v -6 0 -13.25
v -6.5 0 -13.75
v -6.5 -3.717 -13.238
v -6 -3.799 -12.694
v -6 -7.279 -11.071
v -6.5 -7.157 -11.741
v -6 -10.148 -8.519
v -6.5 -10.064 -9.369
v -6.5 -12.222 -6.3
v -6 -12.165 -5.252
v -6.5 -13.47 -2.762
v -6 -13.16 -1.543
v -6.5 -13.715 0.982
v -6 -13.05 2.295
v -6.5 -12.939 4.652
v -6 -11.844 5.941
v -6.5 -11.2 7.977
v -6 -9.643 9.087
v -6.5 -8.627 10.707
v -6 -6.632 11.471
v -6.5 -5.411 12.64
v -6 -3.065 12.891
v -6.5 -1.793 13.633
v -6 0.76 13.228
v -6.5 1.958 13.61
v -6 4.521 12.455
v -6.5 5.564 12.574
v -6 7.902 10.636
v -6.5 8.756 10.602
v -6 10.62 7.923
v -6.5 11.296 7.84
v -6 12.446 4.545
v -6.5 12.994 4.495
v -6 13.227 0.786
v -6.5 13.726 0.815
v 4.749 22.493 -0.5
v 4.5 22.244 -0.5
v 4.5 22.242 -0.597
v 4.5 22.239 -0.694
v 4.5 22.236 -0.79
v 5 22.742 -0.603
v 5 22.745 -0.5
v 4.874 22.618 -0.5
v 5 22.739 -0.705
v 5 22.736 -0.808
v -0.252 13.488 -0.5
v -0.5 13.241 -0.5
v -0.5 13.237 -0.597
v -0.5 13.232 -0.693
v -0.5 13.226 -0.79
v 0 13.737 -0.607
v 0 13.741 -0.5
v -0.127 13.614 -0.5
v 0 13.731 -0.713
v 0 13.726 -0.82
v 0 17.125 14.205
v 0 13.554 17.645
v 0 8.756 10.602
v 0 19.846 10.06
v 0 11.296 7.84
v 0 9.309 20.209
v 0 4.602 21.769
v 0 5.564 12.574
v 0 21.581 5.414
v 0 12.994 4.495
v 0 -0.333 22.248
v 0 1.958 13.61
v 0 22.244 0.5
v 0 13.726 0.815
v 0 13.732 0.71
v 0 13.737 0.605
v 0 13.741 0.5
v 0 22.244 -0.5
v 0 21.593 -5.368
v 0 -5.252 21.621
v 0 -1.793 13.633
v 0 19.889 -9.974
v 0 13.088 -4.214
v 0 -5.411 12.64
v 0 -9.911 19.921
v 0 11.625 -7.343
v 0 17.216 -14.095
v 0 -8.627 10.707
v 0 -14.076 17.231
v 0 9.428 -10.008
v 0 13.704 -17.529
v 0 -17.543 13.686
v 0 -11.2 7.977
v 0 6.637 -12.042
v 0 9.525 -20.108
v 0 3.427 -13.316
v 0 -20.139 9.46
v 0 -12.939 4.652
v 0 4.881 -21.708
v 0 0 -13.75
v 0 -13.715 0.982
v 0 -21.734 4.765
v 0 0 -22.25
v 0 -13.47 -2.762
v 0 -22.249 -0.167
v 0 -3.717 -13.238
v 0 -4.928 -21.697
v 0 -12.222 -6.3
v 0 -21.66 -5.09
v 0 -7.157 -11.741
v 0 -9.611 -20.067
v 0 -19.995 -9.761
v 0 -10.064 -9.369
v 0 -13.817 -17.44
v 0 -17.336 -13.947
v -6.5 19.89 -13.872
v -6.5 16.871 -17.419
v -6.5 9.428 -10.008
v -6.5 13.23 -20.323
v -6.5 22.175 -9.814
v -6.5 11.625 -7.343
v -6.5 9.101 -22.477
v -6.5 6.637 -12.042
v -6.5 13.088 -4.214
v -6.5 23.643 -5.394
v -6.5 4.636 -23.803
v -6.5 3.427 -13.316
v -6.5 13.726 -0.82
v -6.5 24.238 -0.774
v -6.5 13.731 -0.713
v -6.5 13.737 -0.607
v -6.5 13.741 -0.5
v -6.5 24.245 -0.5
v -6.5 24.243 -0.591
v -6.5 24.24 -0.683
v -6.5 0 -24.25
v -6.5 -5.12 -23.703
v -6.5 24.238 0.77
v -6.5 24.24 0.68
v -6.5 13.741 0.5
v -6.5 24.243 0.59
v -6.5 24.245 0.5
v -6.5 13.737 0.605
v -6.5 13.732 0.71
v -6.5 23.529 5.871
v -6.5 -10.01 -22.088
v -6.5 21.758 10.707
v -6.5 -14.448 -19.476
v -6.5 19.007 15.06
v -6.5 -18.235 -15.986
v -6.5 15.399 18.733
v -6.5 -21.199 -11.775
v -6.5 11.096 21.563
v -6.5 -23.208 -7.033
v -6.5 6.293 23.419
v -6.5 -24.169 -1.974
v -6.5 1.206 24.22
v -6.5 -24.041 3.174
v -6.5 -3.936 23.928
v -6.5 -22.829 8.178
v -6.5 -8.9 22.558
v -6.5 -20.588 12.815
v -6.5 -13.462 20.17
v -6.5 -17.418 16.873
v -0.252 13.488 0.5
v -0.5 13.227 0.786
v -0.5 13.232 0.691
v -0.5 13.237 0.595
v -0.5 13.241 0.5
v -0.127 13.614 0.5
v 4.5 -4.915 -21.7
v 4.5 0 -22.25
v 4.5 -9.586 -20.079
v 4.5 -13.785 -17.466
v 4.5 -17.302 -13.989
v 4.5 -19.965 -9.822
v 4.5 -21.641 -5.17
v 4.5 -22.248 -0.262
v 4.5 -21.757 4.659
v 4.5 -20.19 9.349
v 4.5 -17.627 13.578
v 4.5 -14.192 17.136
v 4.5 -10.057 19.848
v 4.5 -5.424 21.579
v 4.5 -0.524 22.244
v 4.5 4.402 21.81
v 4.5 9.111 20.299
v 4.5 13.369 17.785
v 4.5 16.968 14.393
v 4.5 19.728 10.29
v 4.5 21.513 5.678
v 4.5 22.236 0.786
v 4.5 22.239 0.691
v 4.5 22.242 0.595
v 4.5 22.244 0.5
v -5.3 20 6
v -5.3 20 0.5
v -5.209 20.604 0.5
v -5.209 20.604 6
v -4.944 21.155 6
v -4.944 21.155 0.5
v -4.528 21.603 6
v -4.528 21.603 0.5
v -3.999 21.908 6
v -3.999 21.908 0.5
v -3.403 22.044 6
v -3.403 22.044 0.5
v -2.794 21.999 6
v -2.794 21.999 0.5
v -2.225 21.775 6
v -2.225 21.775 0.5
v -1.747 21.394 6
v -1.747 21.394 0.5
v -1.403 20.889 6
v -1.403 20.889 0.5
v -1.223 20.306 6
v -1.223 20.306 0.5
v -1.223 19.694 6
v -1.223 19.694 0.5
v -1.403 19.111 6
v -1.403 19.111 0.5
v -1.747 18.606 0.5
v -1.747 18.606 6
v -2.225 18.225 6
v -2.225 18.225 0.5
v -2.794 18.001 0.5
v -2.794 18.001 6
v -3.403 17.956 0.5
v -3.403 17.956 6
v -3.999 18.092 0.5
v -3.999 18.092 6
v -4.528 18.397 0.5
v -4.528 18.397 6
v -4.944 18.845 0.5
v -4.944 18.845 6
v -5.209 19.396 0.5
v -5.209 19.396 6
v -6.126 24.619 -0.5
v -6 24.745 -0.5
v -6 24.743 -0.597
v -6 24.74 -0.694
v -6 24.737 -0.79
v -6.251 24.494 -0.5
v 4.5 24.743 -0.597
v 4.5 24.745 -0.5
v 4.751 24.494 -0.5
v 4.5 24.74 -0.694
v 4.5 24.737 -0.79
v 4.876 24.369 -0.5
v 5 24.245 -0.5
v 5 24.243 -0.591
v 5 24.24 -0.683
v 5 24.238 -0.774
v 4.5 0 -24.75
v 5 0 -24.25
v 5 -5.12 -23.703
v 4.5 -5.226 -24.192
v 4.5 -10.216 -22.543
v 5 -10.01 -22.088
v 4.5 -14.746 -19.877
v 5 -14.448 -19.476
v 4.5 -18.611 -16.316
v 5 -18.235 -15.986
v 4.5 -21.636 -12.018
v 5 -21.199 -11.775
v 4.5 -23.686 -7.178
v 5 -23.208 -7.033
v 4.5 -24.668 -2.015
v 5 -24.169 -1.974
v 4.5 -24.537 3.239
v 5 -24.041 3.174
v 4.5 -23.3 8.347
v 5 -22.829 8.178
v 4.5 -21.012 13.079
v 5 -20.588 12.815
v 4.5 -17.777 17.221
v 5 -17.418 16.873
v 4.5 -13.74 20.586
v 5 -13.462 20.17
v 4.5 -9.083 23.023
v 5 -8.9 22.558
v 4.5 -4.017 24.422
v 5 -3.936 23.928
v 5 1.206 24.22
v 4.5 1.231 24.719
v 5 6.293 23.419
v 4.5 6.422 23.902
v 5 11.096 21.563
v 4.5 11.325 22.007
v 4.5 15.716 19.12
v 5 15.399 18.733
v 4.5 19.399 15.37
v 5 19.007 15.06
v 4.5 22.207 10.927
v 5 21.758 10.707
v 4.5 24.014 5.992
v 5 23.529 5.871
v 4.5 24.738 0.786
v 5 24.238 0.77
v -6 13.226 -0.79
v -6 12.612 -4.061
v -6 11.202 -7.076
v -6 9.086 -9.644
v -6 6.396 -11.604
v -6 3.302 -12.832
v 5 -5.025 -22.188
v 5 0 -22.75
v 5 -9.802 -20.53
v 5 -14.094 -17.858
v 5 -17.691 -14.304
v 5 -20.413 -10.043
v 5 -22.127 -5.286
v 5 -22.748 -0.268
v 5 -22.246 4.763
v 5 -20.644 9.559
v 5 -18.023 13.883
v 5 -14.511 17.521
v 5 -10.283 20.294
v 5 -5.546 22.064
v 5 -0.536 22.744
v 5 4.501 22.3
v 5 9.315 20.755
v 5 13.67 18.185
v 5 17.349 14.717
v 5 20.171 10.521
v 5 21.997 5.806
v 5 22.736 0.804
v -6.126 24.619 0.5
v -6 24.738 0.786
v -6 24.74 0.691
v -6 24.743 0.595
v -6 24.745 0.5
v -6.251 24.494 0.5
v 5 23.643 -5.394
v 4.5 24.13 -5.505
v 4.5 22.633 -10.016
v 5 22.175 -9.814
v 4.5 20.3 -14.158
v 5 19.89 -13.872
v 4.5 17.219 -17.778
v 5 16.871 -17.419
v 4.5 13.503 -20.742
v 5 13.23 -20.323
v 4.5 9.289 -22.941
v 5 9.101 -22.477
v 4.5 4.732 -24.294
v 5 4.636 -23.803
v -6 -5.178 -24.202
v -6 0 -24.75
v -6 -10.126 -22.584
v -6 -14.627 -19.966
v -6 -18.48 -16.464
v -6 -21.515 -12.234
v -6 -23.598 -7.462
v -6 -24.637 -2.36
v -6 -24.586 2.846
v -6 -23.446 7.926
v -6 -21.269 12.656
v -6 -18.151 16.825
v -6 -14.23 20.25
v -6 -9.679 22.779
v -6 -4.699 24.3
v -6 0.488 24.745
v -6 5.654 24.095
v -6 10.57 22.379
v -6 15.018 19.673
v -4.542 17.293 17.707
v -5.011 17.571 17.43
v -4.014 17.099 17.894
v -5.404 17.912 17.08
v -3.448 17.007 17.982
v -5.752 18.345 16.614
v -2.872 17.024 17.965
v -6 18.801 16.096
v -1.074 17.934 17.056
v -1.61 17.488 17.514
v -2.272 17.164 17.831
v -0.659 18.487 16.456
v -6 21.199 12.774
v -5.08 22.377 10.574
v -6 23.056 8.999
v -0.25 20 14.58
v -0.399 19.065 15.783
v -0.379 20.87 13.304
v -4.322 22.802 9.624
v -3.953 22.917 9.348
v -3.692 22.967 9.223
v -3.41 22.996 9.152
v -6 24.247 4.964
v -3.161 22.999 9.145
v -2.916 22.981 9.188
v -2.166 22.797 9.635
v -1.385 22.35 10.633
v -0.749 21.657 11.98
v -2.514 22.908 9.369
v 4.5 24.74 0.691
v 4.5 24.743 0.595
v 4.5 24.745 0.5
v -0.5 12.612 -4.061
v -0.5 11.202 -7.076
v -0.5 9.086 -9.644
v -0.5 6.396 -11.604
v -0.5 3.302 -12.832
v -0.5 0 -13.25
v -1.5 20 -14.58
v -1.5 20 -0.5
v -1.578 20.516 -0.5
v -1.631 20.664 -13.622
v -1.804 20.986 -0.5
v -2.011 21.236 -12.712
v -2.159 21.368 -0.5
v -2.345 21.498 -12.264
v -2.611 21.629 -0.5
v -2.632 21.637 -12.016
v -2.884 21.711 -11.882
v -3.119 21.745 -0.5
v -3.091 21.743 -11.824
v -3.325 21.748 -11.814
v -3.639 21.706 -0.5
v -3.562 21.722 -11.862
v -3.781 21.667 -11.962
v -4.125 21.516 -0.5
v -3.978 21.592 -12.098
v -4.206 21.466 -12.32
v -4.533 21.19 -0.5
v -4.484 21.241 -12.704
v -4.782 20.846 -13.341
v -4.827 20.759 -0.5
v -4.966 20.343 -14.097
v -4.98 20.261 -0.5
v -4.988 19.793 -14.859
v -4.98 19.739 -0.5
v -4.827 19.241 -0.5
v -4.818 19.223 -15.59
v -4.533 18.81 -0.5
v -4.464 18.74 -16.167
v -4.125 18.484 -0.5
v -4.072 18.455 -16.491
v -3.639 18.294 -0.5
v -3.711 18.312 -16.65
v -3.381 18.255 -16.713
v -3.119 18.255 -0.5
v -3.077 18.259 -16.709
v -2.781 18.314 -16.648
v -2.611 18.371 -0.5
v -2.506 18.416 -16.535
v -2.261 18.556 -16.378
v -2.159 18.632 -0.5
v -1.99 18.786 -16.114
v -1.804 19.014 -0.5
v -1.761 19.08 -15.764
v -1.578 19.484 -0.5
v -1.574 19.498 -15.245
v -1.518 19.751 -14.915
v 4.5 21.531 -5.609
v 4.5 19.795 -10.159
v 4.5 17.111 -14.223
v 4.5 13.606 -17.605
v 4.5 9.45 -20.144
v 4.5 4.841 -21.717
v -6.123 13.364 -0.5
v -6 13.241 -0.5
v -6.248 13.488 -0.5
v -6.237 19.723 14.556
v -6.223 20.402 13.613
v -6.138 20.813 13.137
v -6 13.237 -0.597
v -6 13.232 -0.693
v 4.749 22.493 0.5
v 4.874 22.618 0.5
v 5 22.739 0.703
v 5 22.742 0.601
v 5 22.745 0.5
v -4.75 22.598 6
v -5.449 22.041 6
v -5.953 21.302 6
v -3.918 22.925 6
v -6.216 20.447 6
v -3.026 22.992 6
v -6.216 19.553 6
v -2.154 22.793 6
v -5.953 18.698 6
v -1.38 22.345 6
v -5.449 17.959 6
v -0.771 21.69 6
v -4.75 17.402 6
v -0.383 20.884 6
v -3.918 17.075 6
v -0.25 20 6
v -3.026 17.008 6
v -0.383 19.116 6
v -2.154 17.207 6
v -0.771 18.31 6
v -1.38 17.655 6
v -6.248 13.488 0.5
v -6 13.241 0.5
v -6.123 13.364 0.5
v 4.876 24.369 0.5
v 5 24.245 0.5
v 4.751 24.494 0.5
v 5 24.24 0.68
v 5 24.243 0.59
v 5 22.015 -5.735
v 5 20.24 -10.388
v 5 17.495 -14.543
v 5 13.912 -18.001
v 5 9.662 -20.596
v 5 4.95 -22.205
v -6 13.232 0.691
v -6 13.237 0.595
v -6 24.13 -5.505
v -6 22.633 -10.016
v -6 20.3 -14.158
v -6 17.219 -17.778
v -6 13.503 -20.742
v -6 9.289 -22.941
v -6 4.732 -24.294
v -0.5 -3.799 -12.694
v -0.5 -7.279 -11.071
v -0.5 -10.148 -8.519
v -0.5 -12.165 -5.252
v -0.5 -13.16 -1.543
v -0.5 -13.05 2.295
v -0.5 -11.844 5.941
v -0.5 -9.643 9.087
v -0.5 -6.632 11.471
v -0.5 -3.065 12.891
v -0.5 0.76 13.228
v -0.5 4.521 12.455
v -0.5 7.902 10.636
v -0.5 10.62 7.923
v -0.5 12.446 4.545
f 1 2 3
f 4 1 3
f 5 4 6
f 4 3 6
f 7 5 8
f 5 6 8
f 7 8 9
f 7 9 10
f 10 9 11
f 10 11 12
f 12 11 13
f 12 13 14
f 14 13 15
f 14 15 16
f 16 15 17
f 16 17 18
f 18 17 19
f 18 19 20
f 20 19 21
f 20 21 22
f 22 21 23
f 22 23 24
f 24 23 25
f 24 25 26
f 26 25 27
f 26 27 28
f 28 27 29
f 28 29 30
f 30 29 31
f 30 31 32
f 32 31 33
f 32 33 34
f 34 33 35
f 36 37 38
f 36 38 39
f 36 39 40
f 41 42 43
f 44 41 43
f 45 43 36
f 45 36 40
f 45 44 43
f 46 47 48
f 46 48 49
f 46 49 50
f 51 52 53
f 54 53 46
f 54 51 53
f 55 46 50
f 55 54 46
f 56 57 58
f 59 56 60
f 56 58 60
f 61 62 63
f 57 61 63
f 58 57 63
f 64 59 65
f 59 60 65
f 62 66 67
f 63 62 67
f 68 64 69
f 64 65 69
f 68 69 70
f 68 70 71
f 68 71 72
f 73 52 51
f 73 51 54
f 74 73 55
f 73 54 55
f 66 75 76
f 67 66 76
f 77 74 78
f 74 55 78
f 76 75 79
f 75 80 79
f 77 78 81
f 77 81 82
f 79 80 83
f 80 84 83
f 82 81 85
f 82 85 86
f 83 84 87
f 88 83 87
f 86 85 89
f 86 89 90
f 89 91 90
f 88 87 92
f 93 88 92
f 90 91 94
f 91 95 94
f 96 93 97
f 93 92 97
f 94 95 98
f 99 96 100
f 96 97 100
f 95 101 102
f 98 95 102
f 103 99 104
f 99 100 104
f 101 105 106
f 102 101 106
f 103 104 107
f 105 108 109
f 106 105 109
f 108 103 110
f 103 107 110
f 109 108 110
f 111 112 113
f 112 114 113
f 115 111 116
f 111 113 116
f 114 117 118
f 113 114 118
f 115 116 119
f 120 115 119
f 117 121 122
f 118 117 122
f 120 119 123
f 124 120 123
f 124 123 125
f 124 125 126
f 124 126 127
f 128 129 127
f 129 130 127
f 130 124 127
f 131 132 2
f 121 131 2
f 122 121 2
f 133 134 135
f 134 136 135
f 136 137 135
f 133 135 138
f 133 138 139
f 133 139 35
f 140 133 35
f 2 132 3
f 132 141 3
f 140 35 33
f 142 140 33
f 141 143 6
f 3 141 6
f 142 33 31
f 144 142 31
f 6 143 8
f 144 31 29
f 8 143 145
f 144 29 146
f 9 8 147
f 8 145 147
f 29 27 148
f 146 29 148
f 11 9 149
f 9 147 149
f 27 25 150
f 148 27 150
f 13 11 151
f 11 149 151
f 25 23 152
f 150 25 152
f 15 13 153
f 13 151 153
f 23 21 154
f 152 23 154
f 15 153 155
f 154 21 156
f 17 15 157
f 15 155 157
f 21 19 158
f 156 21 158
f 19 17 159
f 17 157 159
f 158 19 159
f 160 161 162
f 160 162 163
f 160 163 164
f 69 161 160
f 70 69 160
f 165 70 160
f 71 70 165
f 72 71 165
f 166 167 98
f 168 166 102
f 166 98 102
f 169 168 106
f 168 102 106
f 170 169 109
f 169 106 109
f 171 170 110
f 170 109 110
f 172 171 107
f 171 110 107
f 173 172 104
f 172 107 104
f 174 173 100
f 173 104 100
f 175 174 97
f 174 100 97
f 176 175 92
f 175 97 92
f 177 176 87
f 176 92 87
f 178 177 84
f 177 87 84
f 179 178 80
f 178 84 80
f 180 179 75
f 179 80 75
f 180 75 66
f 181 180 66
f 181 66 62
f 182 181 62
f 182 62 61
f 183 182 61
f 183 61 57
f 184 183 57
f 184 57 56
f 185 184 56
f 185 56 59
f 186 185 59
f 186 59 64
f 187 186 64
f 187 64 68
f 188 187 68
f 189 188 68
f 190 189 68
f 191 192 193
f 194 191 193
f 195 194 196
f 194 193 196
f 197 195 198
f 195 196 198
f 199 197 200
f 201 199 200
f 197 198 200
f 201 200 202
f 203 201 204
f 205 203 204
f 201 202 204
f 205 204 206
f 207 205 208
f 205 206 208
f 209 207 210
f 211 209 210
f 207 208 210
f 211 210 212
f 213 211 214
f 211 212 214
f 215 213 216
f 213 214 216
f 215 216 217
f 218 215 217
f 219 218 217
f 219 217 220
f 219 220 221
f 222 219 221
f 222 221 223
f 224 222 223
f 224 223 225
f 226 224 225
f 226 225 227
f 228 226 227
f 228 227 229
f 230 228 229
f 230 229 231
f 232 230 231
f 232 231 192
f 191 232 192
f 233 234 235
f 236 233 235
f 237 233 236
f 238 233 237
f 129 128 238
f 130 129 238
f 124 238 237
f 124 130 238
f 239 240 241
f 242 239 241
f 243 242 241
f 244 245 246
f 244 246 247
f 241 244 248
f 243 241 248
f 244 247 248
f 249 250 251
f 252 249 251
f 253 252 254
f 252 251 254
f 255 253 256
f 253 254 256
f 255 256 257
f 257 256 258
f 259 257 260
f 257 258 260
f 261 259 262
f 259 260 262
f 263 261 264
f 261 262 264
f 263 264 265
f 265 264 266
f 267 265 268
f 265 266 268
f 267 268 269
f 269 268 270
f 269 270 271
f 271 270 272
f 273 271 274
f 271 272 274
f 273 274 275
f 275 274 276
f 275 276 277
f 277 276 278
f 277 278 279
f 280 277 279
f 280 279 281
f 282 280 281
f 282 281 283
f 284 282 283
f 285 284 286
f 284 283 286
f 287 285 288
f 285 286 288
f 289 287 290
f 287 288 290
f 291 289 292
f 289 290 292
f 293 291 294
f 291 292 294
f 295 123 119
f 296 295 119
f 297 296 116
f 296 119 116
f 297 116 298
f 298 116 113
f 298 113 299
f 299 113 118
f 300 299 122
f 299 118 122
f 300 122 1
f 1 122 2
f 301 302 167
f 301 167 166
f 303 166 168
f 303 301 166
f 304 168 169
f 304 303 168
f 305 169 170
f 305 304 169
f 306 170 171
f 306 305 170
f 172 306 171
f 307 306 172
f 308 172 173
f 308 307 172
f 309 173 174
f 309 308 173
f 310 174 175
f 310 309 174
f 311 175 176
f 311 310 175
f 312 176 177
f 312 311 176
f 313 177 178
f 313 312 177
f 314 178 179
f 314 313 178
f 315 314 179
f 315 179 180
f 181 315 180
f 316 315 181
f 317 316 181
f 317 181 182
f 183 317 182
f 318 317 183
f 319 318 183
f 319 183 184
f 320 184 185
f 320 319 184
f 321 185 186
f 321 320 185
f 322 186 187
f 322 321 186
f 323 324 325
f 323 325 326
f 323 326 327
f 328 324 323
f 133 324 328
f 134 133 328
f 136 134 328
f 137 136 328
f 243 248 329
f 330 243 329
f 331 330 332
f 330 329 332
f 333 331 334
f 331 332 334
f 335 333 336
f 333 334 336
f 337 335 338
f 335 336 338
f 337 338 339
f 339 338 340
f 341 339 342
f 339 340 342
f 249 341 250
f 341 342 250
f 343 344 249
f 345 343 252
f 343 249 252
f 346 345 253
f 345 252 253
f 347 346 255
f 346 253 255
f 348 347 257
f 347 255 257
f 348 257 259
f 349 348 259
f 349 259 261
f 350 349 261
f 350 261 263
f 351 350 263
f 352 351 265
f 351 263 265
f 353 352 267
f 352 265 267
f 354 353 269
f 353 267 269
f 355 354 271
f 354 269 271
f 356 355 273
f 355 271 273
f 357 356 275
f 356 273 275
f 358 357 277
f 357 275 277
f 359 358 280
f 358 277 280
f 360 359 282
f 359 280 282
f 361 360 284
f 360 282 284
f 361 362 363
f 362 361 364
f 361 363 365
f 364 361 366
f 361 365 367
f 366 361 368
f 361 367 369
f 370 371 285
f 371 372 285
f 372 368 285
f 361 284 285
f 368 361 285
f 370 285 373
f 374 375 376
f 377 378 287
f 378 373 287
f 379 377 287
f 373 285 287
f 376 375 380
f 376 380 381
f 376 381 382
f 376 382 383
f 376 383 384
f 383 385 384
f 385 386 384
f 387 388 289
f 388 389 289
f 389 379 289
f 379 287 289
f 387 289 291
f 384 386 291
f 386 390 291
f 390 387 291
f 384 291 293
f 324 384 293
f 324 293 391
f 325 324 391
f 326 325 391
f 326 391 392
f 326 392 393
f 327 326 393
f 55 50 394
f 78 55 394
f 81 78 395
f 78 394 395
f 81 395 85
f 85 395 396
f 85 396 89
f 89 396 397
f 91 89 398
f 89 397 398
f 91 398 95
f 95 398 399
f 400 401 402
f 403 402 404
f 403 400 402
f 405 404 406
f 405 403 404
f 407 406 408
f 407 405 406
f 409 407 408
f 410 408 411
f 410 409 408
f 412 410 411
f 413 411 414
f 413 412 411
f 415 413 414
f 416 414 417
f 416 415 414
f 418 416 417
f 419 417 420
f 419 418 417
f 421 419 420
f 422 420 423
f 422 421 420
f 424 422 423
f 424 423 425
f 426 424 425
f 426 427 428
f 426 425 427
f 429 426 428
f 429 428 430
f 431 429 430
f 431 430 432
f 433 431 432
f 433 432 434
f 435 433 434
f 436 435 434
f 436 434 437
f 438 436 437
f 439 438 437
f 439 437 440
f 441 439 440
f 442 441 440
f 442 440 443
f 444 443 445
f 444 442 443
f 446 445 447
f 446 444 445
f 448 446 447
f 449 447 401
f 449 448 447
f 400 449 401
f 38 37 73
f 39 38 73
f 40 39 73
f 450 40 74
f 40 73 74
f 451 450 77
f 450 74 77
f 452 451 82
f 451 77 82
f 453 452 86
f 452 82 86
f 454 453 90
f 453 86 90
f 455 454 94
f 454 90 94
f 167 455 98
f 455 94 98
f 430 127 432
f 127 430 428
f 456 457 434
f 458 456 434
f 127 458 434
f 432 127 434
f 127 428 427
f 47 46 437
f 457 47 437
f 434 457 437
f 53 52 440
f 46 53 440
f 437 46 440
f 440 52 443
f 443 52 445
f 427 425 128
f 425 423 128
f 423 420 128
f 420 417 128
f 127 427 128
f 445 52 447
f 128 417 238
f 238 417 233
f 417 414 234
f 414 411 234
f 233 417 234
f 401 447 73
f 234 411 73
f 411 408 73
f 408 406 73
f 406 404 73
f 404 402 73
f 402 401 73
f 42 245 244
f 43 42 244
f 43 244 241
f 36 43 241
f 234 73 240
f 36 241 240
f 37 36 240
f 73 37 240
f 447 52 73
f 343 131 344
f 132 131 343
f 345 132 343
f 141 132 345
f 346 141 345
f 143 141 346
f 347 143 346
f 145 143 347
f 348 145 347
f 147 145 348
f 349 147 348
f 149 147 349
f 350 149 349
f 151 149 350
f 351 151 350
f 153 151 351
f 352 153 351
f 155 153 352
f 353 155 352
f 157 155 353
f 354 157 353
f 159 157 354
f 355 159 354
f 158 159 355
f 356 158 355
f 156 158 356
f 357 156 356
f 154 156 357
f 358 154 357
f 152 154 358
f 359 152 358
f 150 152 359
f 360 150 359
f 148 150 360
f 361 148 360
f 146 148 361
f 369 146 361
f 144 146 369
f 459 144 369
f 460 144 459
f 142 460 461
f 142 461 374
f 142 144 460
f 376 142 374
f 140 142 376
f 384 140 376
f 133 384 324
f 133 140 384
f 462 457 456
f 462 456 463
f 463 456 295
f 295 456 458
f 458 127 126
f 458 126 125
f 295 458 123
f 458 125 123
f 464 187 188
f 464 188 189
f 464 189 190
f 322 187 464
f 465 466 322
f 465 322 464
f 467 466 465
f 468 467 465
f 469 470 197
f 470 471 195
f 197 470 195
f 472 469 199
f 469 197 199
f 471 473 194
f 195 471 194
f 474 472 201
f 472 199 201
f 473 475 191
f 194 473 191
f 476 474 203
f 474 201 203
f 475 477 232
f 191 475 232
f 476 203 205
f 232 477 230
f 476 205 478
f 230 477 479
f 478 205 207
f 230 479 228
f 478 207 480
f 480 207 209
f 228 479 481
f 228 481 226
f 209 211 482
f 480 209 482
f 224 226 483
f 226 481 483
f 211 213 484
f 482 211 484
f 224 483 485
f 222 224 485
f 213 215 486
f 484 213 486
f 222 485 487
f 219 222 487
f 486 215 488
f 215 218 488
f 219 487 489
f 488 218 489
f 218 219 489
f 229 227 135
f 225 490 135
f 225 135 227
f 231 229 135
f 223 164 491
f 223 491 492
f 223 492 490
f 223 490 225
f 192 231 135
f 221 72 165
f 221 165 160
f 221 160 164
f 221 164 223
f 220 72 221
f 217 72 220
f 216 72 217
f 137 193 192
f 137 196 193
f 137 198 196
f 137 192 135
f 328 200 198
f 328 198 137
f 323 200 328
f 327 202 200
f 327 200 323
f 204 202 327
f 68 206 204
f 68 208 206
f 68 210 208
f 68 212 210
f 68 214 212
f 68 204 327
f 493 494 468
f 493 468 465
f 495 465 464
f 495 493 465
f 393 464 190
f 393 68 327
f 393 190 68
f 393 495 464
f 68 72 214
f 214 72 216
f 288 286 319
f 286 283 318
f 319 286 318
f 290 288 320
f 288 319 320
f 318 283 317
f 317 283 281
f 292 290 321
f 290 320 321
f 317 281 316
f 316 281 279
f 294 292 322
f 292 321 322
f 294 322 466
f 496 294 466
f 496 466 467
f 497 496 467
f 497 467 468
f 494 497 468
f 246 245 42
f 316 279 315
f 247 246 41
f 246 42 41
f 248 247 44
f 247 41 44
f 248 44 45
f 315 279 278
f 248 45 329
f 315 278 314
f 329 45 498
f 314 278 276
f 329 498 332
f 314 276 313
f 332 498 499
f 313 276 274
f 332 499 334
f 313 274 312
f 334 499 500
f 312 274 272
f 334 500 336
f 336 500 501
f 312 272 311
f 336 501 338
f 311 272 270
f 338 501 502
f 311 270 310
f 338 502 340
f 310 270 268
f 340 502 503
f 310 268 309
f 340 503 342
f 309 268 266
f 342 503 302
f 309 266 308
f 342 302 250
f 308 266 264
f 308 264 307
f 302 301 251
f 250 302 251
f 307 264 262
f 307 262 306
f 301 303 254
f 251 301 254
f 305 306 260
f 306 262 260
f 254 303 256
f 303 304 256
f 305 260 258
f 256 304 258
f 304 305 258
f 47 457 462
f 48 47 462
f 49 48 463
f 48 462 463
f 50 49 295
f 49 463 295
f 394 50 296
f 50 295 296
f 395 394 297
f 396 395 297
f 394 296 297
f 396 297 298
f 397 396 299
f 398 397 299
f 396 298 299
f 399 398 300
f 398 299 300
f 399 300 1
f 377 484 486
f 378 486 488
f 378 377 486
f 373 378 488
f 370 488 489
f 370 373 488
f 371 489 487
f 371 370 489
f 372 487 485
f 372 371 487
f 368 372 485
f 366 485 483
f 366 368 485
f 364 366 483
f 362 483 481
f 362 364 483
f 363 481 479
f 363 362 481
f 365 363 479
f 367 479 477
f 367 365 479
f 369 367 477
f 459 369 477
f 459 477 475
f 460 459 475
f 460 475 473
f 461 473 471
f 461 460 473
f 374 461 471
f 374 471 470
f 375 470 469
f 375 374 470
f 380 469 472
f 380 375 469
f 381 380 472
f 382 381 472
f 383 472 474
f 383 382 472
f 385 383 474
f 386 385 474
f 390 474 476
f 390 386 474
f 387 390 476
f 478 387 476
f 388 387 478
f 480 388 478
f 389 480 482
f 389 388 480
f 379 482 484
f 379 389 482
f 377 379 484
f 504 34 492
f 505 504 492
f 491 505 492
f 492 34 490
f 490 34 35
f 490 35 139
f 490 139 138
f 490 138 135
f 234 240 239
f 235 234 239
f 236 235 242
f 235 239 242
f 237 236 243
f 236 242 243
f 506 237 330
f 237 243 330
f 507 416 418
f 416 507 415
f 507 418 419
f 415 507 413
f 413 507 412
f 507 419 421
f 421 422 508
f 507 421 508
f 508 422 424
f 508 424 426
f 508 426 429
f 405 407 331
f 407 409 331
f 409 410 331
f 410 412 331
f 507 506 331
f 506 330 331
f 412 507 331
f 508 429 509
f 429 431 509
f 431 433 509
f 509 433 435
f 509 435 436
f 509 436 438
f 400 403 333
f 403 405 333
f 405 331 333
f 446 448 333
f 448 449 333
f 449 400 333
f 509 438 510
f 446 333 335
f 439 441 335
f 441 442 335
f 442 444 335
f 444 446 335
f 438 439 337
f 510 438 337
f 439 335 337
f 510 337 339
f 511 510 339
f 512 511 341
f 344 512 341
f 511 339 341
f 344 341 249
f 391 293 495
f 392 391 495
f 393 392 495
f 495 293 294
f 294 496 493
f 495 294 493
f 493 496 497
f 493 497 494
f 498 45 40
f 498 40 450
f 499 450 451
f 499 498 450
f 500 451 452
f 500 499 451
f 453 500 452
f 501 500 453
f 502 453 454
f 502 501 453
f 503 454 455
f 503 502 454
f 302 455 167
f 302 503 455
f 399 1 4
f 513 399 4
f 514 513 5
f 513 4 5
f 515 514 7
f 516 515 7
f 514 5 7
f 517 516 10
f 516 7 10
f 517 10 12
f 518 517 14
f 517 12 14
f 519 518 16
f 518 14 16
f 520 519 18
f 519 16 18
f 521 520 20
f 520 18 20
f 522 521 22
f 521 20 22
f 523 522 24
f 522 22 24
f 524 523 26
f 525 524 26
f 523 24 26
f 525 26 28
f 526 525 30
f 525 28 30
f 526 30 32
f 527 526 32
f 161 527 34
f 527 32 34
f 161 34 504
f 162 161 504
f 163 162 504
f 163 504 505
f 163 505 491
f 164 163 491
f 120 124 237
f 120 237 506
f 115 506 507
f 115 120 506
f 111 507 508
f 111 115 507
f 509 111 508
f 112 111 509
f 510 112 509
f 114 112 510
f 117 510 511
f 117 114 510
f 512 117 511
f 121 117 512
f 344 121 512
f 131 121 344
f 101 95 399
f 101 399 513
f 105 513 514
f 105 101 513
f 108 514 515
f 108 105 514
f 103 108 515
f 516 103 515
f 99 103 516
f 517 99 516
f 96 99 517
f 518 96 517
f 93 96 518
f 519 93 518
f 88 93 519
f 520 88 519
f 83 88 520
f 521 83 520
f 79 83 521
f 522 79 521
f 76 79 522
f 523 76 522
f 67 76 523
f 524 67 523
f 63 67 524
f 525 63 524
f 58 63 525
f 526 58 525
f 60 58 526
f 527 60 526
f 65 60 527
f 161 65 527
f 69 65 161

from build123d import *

# Parameters (mm, degrees)
ESQUISSE2_W                  = 1
ESQUISSE2_H                  = 24.75
ENL_V_MAT_EXTRU_1_DEPTH      = 37.842570486
ENL_V_MAT_EXTRU_2_DEPTH      = 36.600210674
ENL_V_MAT_EXTRU_2_DEPTH_BACK = 36.600210674
ESQUISSE3_R                  = 1.75
ESQUISSE4_W                  = 11.987843117
ESQUISSE4_H                  = 3
CHANFREIN1_SIZE              = 0.5
ESQUISSE5_R                  = 2.05
ENL_V_MAT_EXTRU_3_DEPTH      = 36.949617679


with BuildPart() as part:
    # Esquisse1 → Révolution1 (revolve)
    with BuildSketch(Plane.XY, mode=Mode.PRIVATE) as r_volution1_sk:
        Polygon((0, 13.25), (-6.5, 13.25), (-6.5, 24.75), (5, 24.75), (5, 22.25), (0, 22.25), align=None)
    revolve(r_volution1_sk.sketch.rotate(Axis((0, 0, 0), (-1, 0, 0)), 90), axis=Axis((0, 0, 0), (-1, 0, 0)))

    # Esquisse2 → Enlèv. mat.-Extru.1 (cut, through all)
    with BuildSketch(Plane(origin=(5, 0, 0), x_dir=(0, 0, -1), z_dir=(1, 0, 0))):
        with Locations((0, 12.375)):
            Rectangle(ESQUISSE2_W, ESQUISSE2_H)
    extrude(amount=-ENL_V_MAT_EXTRU_1_DEPTH, mode=Mode.SUBTRACT)

    # Esquisse3 → Enlèv. mat.-Extru.2 (cut, two sides: drawn at the far end of the back side and taken through both)
    with BuildSketch(Plane.XY.offset(-ENL_V_MAT_EXTRU_2_DEPTH_BACK)):
        with Locations((-3.25, 20)):
            Circle(ESQUISSE3_R)
    extrude(amount=ENL_V_MAT_EXTRU_2_DEPTH + ENL_V_MAT_EXTRU_2_DEPTH_BACK, mode=Mode.SUBTRACT)

    # Esquisse4 → Enlèvement de matière-Révolution1 (revolve, cut)
    with BuildSketch(Plane.ZY.offset(3.25), mode=Mode.PRIVATE) as enl_vement_de_mati_re_r_volution1_sk:
        with Locations((11.993921559, 18.5)):
            Rectangle(ESQUISSE4_W, ESQUISSE4_H)
    revolve(enl_vement_de_mati_re_r_volution1_sk.sketch.rotate(Axis((-3.25, 20, 6), (0, 0, -1)), 270), axis=Axis((-3.25, 20, 6), (0, 0, -1)), mode=Mode.SUBTRACT)

    # Chanfrein1
    # the kernel refuses this chamfer: 0.5 mm, written as the material it takes off along each edge
    with BuildSketch(Plane(origin=(5, 0, 0), x_dir=(0, 0, -1), z_dir=(0, 1, 0))) as chanfrein1_piece_1:
        Polygon((22.25, CHANFREIN1_SIZE), (22.25 + CHANFREIN1_SIZE, 0), (22.25, 0), align=None)
    chanfrein1_piece_1_solid = revolve(axis=Axis((5, 0, 0), (-1, 0, 0)), revolution_arc=272.035388743, mode=Mode.PRIVATE)
    with BuildSketch(Plane(origin=(5, 0, 0), x_dir=(0, 0, -1), z_dir=(0, 1, 0))) as chanfrein1_piece_2:
        Polygon((24.75, CHANFREIN1_SIZE), (24.75 - CHANFREIN1_SIZE, 0), (24.75, 0), align=None)
    chanfrein1_piece_2_solid = revolve(axis=Axis((5, 0, 0), (-1, 0, 0)), revolution_arc=271.829822987, mode=Mode.PRIVATE)
    with BuildSketch(Plane(origin=(-6.5, 0, 0), x_dir=(0, 0, -1), z_dir=(0, 1, 0))) as chanfrein1_piece_3:
        Polygon((24.75, -CHANFREIN1_SIZE), (24.75 - CHANFREIN1_SIZE, 0), (24.75, 0), align=None)
    chanfrein1_piece_3_solid = revolve(axis=Axis((-6.5, 0, 0), (-1, 0, 0)), revolution_arc=271.829822987, mode=Mode.PRIVATE)
    with BuildSketch(Plane(origin=(0, 0, 0), x_dir=(0, 0, -1), z_dir=(0, 1, 0))) as chanfrein1_piece_4:
        Polygon((13.25, CHANFREIN1_SIZE), (13.25 + CHANFREIN1_SIZE, 0), (13.25, 0), align=None)
    chanfrein1_piece_4_solid = revolve(axis=Axis((0, 0, 0), (-1, 0, 0)), revolution_arc=273.417455425, mode=Mode.PRIVATE)
    with BuildSketch(Plane(origin=(-6.5, 0, 0), x_dir=(0, 0, -1), z_dir=(0, 1, 0))) as chanfrein1_piece_5:
        Polygon((13.25, -CHANFREIN1_SIZE), (13.25 + CHANFREIN1_SIZE, 0), (13.25, 0), align=None)
    chanfrein1_piece_5_solid = revolve(axis=Axis((-6.5, 0, 0), (-1, 0, 0)), revolution_arc=273.417455425, mode=Mode.PRIVATE)
    with BuildSketch(Plane(origin=(-6.5, 0, 0), x_dir=(0, 0.9982400789051599, 0.059302148927506945), z_dir=(0, -0.059302148927506945, 0.9982400789051599))) as chanfrein1_piece_6:
        Polygon((13.25, -CHANFREIN1_SIZE), (13.25 + CHANFREIN1_SIZE, 0), (13.25, 0), align=None)
    chanfrein1_piece_6_solid = revolve(axis=Axis((-6.5, 0, 0), (-1, 0, 0)), revolution_arc=93.399757519, mode=Mode.PRIVATE)
    with BuildSketch(Plane(origin=(0, 0, 0), x_dir=(0, 0.9982400789051599, 0.059302148927506945), z_dir=(0, -0.059302148927506945, 0.9982400789051599))) as chanfrein1_piece_7:
        Polygon((13.25 + CHANFREIN1_SIZE, 0), (13.25, CHANFREIN1_SIZE), (13.25, 0), align=None)
    chanfrein1_piece_7_solid = revolve(axis=Axis((0, 0, 0), (-1, 0, 0)), revolution_arc=93.399757519, mode=Mode.PRIVATE)
    with BuildSketch(Plane(origin=(-6.5, 0, 0), x_dir=(0, 0.9994953717545437, 0.0317647893310561), z_dir=(0, -0.0317647893310561, 0.9994953717545437))) as chanfrein1_piece_8:
        Polygon((24.75, -CHANFREIN1_SIZE), (24.75 - CHANFREIN1_SIZE, 0), (24.75, 0), align=None)
    chanfrein1_piece_8_solid = revolve(axis=Axis((-6.5, 0, 0), (-1, 0, 0)), revolution_arc=91.820294567, mode=Mode.PRIVATE)
    with BuildSketch(Plane(origin=(5, 0, 0), x_dir=(0, 0.9994953717545433, 0.03176478933106764), z_dir=(0, -0.03176478933106764, 0.9994953717545433))) as chanfrein1_piece_9:
        Polygon((24.75, CHANFREIN1_SIZE), (24.75 - CHANFREIN1_SIZE, 0), (24.75, 0), align=None)
    chanfrein1_piece_9_solid = revolve(axis=Axis((5, 0, 0), (-1, 0, 0)), revolution_arc=91.820294567, mode=Mode.PRIVATE)
    with BuildSketch(Plane(origin=(5, 0, 0), x_dir=(0, 0.9993756290126987, 0.03533202705015153), z_dir=(0, -0.03533202705015153, 0.9993756290126987))) as chanfrein1_piece_10:
        Polygon((22.25, CHANFREIN1_SIZE), (22.25 + CHANFREIN1_SIZE, 0), (22.25, 0), align=None)
    chanfrein1_piece_10_solid = revolve(axis=Axis((5, 0, 0), (-1, 0, 0)), revolution_arc=92.024797457, mode=Mode.PRIVATE)
    add([chanfrein1_piece_1_solid, chanfrein1_piece_2_solid, chanfrein1_piece_3_solid, chanfrein1_piece_4_solid, chanfrein1_piece_5_solid, chanfrein1_piece_6_solid, chanfrein1_piece_7_solid, chanfrein1_piece_8_solid, chanfrein1_piece_9_solid, chanfrein1_piece_10_solid], mode=Mode.SUBTRACT)

    # Esquisse5 → Enlèv. mat.-Extru.3 (cut, through all)
    with BuildSketch(Plane(origin=(0, 0, 0.5), x_dir=(-1, 0, 0), z_dir=(0, 0, -1))):
        with Locations((3.25, 20)):
            Circle(ESQUISSE5_R)
    extrude(amount=-ENL_V_MAT_EXTRU_3_DEPTH, mode=Mode.SUBTRACT)


solid = part.part
